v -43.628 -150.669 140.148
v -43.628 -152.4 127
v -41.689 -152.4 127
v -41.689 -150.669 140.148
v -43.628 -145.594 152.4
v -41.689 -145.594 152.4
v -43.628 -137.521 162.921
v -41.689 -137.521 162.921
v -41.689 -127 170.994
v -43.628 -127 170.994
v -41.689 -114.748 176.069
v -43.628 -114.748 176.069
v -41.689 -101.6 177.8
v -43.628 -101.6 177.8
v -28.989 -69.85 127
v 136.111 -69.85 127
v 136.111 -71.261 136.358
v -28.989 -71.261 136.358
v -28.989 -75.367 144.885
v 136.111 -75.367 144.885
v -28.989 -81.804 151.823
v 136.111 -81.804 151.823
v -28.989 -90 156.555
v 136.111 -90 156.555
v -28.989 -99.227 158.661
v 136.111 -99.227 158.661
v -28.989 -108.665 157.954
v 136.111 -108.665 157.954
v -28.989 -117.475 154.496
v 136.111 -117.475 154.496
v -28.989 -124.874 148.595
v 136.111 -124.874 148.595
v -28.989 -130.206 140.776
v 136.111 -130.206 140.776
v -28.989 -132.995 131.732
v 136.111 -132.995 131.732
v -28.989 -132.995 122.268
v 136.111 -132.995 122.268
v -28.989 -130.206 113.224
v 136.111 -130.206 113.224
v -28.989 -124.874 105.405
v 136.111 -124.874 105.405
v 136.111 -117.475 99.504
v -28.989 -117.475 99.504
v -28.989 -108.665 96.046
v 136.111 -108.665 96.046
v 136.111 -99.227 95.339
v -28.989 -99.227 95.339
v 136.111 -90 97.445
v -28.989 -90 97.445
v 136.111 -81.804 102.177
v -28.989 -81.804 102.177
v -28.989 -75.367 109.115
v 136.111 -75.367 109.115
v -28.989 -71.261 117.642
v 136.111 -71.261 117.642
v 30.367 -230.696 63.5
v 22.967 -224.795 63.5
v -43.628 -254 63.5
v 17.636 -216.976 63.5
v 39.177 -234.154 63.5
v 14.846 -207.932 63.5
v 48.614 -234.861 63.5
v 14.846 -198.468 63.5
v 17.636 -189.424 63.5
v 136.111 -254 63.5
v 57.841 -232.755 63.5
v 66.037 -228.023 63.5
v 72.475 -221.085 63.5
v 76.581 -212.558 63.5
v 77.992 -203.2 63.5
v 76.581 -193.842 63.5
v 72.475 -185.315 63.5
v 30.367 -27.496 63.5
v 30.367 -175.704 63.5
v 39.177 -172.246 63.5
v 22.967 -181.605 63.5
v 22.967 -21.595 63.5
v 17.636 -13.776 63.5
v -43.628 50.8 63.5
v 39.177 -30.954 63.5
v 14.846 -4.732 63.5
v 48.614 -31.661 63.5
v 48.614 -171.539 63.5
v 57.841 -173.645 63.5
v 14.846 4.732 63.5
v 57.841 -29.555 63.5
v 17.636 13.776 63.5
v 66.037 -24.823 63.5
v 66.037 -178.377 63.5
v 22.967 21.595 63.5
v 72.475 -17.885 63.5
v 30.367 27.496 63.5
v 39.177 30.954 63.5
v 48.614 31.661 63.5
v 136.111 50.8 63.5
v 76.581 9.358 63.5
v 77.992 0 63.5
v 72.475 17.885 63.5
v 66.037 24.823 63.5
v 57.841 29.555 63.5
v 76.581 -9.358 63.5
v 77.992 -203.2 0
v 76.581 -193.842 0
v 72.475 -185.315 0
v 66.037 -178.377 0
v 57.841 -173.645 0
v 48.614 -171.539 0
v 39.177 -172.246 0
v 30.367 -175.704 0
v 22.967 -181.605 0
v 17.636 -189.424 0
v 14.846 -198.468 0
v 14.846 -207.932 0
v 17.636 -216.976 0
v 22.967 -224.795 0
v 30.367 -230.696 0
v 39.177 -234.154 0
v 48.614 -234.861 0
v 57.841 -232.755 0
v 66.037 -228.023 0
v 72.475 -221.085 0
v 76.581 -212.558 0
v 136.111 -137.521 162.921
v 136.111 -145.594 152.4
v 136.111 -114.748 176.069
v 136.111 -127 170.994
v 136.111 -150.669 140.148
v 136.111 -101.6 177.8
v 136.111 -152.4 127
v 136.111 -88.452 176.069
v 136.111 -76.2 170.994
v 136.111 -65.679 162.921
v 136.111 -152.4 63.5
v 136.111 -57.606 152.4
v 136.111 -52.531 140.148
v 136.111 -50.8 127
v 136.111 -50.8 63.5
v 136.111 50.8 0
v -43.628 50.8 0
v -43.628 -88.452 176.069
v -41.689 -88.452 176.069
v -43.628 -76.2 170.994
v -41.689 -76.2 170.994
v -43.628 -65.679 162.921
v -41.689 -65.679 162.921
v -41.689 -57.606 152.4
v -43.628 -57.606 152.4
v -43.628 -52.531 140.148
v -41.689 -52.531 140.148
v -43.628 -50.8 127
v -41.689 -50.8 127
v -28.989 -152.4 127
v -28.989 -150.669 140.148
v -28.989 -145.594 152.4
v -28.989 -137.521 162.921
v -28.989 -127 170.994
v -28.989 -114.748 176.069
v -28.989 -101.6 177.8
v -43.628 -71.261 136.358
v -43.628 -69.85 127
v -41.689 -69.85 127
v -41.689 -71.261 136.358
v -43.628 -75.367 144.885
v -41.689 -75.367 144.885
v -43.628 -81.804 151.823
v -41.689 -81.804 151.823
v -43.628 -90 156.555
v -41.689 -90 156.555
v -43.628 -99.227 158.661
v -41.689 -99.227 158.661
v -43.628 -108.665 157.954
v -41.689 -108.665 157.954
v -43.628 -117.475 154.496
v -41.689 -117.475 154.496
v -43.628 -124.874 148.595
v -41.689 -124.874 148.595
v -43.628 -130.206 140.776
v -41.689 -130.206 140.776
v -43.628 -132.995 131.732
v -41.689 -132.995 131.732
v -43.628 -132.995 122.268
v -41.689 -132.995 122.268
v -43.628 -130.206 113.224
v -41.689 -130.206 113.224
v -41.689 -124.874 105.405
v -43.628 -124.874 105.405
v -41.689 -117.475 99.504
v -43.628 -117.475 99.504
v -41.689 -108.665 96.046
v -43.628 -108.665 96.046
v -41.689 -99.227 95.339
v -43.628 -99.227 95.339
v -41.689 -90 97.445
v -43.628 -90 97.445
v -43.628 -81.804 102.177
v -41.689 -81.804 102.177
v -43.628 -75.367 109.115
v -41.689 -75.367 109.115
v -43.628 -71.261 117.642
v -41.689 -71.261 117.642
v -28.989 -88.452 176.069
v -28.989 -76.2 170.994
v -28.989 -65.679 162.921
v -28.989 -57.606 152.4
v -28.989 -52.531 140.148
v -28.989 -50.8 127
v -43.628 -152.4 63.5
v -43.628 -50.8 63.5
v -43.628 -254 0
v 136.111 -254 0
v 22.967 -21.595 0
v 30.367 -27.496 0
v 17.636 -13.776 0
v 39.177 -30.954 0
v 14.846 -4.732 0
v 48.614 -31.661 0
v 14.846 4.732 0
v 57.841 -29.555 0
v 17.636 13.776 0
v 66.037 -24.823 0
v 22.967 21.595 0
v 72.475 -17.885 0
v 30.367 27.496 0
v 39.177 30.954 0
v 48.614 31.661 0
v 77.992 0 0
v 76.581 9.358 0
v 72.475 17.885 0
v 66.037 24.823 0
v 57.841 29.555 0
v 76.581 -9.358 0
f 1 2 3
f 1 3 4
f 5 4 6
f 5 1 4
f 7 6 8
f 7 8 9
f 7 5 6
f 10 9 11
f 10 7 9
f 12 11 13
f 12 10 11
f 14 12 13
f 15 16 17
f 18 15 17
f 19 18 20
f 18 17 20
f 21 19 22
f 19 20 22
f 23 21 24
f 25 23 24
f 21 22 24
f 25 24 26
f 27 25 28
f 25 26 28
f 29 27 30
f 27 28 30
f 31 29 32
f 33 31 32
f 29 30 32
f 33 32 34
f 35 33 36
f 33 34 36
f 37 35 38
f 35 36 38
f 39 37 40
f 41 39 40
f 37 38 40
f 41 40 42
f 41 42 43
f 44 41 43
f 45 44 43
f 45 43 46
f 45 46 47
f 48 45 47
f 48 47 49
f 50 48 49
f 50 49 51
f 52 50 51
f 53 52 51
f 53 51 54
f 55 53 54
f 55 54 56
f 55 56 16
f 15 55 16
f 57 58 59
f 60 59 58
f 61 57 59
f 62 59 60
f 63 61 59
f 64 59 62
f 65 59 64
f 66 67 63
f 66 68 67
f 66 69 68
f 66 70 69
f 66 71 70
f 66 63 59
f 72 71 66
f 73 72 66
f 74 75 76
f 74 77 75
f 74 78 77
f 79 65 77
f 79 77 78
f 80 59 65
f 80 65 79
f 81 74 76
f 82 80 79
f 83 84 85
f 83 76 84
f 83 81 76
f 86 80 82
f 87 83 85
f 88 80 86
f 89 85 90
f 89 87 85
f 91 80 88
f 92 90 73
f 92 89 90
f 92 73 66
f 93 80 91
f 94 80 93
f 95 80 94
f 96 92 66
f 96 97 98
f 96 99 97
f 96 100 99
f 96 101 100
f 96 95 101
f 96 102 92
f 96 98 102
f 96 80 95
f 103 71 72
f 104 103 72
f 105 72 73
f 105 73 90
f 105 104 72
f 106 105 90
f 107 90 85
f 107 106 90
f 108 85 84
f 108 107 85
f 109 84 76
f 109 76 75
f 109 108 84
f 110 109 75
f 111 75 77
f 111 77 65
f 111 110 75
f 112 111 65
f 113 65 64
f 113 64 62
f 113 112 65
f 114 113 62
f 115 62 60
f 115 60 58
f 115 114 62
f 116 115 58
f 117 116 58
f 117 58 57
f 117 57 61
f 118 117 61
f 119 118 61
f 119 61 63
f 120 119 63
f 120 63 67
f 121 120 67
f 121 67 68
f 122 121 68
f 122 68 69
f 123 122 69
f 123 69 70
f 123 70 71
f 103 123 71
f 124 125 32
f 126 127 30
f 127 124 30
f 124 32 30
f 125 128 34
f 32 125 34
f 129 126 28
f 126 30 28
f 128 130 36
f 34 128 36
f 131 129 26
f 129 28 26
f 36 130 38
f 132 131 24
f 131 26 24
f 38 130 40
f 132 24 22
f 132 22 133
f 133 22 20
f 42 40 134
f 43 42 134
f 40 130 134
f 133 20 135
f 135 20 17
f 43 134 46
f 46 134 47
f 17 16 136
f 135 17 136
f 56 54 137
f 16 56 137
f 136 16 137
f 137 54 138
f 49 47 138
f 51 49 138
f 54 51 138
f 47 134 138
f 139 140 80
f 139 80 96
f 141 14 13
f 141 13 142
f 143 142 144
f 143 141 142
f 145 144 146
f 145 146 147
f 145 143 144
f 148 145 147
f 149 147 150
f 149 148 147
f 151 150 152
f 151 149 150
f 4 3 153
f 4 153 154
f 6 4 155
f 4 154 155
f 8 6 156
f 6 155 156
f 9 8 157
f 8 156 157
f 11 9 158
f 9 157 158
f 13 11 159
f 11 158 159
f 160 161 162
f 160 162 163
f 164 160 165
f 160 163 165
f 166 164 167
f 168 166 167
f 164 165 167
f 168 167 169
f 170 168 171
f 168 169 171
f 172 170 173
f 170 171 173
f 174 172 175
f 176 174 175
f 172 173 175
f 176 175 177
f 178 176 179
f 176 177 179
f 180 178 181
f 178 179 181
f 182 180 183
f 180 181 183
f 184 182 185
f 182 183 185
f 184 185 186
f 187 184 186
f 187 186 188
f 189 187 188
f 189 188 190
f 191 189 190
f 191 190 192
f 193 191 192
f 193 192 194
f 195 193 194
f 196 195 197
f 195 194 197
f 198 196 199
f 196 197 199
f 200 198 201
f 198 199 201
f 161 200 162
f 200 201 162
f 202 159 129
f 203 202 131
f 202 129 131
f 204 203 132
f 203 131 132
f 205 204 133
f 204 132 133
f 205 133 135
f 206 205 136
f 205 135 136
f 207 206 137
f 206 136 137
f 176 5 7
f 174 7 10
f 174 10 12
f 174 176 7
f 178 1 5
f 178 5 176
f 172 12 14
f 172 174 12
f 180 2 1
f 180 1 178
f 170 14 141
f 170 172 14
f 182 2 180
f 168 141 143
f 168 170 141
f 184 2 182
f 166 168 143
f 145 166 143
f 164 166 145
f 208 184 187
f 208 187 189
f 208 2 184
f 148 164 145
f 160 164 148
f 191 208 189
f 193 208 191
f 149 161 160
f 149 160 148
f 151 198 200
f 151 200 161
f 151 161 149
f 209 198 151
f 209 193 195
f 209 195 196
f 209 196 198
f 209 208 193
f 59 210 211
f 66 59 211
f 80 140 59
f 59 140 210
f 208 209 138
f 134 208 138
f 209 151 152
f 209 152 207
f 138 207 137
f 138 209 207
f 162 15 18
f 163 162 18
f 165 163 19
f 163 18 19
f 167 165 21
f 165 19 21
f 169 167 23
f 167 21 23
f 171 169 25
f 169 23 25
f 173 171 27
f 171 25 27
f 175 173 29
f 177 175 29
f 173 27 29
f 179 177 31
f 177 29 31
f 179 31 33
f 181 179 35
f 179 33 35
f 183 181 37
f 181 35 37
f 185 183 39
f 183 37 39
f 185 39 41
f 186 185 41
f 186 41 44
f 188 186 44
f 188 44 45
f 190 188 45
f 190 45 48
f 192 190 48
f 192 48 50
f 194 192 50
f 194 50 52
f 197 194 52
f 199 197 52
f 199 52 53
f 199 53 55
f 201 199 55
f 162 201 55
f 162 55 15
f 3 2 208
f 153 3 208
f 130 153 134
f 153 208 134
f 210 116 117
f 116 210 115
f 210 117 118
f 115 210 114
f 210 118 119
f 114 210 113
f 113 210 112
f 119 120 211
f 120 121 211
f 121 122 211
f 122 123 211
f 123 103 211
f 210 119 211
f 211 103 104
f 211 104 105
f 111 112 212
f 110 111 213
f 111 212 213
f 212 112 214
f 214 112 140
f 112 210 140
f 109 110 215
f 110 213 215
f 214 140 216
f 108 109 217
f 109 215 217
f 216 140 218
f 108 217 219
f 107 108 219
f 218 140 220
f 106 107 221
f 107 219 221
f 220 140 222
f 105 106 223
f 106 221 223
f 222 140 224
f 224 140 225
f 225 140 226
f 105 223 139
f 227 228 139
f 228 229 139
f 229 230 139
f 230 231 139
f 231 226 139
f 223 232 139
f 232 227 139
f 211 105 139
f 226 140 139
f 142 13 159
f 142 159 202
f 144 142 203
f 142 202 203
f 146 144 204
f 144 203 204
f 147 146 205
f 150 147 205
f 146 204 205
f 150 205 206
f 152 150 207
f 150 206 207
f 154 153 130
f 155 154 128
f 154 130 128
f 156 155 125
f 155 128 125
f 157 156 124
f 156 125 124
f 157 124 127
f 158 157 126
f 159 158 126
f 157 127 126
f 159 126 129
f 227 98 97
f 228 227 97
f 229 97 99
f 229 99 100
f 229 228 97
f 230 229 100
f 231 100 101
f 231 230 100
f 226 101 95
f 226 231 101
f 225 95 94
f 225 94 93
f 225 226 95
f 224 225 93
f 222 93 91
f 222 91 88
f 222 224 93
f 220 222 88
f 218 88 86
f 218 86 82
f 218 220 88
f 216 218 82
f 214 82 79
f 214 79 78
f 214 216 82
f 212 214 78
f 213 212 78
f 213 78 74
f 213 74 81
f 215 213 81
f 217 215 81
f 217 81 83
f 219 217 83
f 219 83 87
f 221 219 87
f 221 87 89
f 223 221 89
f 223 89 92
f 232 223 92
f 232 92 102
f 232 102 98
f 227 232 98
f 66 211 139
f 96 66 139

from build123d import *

# Parameters (mm, degrees)
F0_W      = 179.7395497561
F0_H      = 101.6
F0_R      = 31.75
F1_DEPTH  = 25.4
F1_FACE_W = 179.7395497561
F1_FACE_H = 304.8
F1_FACE_R = 31.75
F2_DEPTH  = 38.1
F3_W      = 179.7395497561
F3_H      = 101.6
F4_DEPTH  = 114.3
F5_R      = 31.75
F6_DEPTH  = 177.8
F7_R      = 31.75
F8_DEPTH  = 12.7


with BuildPart() as f1:
    # F0 (on Top) → F1 (new body)
    with BuildSketch(Plane.XY):
        with Locations((46.2416782975, 0)):
            Rectangle(F0_W, F0_H)
        with Locations((46.2416782975, 0)):
            Circle(F0_R, mode=Mode.SUBTRACT)
        with Locations((46.2416782975, -101.6)):
            Rectangle(F0_W, F0_H)
        with Locations((46.2416782975, -203.2)):
            Rectangle(F0_W, F0_H)
        with Locations((46.2416782975, -203.2)):
            Circle(F0_R, mode=Mode.SUBTRACT)
    extrude(amount=F1_DEPTH)

    # F0 (on Top) + F1_face (on face) → F2 (join)
    with BuildSketch(Plane.XY):
        with Locations((46.2416782975, 0)):
            Rectangle(F0_W, F0_H)
        with Locations((46.2416782975, 0)):
            Circle(F0_R, mode=Mode.SUBTRACT)
        with Locations((46.2416782975, -101.6)):
            Rectangle(F0_W, F0_H)
        with Locations((46.2416782975, -203.2)):
            Rectangle(F0_W, F0_H)
        with Locations((46.2416782975, -203.2)):
            Circle(F0_R, mode=Mode.SUBTRACT)
    with BuildSketch(Plane(origin=(46.2416782975, -101.6, 25.4), x_dir=(1, 0, 0), z_dir=(0, 0, 1))):
        Rectangle(F1_FACE_W, F1_FACE_H)
        with Locations((0, 101.6)):
            Circle(F1_FACE_R, mode=Mode.SUBTRACT)
        with Locations((0, -101.6)):
            Circle(F1_FACE_R, mode=Mode.SUBTRACT)
    extrude(amount=F2_DEPTH)


with BuildPart() as f4:
    # F3 (on face) → F4 (new body)
    with BuildSketch(Plane.XY.offset(63.5)):
        with Locations((46.2416782975, -101.6)):
            Rectangle(F3_W, F3_H)
    extrude(amount=F4_DEPTH)

    # F5 (on face) → F6 (cut, symmetric)
    with BuildSketch(Plane.YZ.offset(136.1114531755)):
        with Locations((-101.6, 127)):
            Circle(F5_R)
        with BuildLine():
            ThreePointArc((-152.4, 127), (-137.5210244843, 162.9210244843), (-101.6, 177.8))
            Line((-101.6, 177.8), (-152.4, 177.8))
            Line((-152.4, 177.8), (-152.4, 127))
        make_face()
        with BuildLine():
            ThreePointArc((-101.6, 177.8), (-65.6789755157, 162.9210244843), (-50.8, 127))
            Line((-50.8, 127), (-50.8, 160.3168845177))
            Line((-50.8, 160.3168845177), (-50.8, 177.8))
            Line((-50.8, 177.8), (-101.6, 177.8))
        make_face()
    extrude(amount=F6_DEPTH, both=True, mode=Mode.SUBTRACT)

    # F6_face (on face) + F7 (on face) → F8 (cut, symmetric)
    with BuildSketch(Plane(origin=(-41.6885468245, -101.6, 127), x_dir=(0, 1, 0), z_dir=(1, 0, 0))):
        with BuildLine():
            ThreePointArc((-50.8, 0), (-35.9210244843, 35.9210244843), (0, 50.8))
            Line((0, 50.8), (-50.8, 50.8))
            Line((-50.8, 50.8), (-50.8, 0))
        make_face()
        with BuildLine():
            Line((50.8, 50.8), (0, 50.8))
            ThreePointArc((0, 50.8), (35.9210244843, 35.9210244843), (50.8, 0))
            Line((50.8, 0), (50.8, 50.8))
        make_face()
    with BuildSketch(Plane.YZ.offset(-41.6885468245)):
        with Locations((-101.6, 127)):
            Circle(F7_R)
    extrude(amount=F8_DEPTH, both=True, mode=Mode.SUBTRACT)


solid = Compound([f1.part, f4.part])
